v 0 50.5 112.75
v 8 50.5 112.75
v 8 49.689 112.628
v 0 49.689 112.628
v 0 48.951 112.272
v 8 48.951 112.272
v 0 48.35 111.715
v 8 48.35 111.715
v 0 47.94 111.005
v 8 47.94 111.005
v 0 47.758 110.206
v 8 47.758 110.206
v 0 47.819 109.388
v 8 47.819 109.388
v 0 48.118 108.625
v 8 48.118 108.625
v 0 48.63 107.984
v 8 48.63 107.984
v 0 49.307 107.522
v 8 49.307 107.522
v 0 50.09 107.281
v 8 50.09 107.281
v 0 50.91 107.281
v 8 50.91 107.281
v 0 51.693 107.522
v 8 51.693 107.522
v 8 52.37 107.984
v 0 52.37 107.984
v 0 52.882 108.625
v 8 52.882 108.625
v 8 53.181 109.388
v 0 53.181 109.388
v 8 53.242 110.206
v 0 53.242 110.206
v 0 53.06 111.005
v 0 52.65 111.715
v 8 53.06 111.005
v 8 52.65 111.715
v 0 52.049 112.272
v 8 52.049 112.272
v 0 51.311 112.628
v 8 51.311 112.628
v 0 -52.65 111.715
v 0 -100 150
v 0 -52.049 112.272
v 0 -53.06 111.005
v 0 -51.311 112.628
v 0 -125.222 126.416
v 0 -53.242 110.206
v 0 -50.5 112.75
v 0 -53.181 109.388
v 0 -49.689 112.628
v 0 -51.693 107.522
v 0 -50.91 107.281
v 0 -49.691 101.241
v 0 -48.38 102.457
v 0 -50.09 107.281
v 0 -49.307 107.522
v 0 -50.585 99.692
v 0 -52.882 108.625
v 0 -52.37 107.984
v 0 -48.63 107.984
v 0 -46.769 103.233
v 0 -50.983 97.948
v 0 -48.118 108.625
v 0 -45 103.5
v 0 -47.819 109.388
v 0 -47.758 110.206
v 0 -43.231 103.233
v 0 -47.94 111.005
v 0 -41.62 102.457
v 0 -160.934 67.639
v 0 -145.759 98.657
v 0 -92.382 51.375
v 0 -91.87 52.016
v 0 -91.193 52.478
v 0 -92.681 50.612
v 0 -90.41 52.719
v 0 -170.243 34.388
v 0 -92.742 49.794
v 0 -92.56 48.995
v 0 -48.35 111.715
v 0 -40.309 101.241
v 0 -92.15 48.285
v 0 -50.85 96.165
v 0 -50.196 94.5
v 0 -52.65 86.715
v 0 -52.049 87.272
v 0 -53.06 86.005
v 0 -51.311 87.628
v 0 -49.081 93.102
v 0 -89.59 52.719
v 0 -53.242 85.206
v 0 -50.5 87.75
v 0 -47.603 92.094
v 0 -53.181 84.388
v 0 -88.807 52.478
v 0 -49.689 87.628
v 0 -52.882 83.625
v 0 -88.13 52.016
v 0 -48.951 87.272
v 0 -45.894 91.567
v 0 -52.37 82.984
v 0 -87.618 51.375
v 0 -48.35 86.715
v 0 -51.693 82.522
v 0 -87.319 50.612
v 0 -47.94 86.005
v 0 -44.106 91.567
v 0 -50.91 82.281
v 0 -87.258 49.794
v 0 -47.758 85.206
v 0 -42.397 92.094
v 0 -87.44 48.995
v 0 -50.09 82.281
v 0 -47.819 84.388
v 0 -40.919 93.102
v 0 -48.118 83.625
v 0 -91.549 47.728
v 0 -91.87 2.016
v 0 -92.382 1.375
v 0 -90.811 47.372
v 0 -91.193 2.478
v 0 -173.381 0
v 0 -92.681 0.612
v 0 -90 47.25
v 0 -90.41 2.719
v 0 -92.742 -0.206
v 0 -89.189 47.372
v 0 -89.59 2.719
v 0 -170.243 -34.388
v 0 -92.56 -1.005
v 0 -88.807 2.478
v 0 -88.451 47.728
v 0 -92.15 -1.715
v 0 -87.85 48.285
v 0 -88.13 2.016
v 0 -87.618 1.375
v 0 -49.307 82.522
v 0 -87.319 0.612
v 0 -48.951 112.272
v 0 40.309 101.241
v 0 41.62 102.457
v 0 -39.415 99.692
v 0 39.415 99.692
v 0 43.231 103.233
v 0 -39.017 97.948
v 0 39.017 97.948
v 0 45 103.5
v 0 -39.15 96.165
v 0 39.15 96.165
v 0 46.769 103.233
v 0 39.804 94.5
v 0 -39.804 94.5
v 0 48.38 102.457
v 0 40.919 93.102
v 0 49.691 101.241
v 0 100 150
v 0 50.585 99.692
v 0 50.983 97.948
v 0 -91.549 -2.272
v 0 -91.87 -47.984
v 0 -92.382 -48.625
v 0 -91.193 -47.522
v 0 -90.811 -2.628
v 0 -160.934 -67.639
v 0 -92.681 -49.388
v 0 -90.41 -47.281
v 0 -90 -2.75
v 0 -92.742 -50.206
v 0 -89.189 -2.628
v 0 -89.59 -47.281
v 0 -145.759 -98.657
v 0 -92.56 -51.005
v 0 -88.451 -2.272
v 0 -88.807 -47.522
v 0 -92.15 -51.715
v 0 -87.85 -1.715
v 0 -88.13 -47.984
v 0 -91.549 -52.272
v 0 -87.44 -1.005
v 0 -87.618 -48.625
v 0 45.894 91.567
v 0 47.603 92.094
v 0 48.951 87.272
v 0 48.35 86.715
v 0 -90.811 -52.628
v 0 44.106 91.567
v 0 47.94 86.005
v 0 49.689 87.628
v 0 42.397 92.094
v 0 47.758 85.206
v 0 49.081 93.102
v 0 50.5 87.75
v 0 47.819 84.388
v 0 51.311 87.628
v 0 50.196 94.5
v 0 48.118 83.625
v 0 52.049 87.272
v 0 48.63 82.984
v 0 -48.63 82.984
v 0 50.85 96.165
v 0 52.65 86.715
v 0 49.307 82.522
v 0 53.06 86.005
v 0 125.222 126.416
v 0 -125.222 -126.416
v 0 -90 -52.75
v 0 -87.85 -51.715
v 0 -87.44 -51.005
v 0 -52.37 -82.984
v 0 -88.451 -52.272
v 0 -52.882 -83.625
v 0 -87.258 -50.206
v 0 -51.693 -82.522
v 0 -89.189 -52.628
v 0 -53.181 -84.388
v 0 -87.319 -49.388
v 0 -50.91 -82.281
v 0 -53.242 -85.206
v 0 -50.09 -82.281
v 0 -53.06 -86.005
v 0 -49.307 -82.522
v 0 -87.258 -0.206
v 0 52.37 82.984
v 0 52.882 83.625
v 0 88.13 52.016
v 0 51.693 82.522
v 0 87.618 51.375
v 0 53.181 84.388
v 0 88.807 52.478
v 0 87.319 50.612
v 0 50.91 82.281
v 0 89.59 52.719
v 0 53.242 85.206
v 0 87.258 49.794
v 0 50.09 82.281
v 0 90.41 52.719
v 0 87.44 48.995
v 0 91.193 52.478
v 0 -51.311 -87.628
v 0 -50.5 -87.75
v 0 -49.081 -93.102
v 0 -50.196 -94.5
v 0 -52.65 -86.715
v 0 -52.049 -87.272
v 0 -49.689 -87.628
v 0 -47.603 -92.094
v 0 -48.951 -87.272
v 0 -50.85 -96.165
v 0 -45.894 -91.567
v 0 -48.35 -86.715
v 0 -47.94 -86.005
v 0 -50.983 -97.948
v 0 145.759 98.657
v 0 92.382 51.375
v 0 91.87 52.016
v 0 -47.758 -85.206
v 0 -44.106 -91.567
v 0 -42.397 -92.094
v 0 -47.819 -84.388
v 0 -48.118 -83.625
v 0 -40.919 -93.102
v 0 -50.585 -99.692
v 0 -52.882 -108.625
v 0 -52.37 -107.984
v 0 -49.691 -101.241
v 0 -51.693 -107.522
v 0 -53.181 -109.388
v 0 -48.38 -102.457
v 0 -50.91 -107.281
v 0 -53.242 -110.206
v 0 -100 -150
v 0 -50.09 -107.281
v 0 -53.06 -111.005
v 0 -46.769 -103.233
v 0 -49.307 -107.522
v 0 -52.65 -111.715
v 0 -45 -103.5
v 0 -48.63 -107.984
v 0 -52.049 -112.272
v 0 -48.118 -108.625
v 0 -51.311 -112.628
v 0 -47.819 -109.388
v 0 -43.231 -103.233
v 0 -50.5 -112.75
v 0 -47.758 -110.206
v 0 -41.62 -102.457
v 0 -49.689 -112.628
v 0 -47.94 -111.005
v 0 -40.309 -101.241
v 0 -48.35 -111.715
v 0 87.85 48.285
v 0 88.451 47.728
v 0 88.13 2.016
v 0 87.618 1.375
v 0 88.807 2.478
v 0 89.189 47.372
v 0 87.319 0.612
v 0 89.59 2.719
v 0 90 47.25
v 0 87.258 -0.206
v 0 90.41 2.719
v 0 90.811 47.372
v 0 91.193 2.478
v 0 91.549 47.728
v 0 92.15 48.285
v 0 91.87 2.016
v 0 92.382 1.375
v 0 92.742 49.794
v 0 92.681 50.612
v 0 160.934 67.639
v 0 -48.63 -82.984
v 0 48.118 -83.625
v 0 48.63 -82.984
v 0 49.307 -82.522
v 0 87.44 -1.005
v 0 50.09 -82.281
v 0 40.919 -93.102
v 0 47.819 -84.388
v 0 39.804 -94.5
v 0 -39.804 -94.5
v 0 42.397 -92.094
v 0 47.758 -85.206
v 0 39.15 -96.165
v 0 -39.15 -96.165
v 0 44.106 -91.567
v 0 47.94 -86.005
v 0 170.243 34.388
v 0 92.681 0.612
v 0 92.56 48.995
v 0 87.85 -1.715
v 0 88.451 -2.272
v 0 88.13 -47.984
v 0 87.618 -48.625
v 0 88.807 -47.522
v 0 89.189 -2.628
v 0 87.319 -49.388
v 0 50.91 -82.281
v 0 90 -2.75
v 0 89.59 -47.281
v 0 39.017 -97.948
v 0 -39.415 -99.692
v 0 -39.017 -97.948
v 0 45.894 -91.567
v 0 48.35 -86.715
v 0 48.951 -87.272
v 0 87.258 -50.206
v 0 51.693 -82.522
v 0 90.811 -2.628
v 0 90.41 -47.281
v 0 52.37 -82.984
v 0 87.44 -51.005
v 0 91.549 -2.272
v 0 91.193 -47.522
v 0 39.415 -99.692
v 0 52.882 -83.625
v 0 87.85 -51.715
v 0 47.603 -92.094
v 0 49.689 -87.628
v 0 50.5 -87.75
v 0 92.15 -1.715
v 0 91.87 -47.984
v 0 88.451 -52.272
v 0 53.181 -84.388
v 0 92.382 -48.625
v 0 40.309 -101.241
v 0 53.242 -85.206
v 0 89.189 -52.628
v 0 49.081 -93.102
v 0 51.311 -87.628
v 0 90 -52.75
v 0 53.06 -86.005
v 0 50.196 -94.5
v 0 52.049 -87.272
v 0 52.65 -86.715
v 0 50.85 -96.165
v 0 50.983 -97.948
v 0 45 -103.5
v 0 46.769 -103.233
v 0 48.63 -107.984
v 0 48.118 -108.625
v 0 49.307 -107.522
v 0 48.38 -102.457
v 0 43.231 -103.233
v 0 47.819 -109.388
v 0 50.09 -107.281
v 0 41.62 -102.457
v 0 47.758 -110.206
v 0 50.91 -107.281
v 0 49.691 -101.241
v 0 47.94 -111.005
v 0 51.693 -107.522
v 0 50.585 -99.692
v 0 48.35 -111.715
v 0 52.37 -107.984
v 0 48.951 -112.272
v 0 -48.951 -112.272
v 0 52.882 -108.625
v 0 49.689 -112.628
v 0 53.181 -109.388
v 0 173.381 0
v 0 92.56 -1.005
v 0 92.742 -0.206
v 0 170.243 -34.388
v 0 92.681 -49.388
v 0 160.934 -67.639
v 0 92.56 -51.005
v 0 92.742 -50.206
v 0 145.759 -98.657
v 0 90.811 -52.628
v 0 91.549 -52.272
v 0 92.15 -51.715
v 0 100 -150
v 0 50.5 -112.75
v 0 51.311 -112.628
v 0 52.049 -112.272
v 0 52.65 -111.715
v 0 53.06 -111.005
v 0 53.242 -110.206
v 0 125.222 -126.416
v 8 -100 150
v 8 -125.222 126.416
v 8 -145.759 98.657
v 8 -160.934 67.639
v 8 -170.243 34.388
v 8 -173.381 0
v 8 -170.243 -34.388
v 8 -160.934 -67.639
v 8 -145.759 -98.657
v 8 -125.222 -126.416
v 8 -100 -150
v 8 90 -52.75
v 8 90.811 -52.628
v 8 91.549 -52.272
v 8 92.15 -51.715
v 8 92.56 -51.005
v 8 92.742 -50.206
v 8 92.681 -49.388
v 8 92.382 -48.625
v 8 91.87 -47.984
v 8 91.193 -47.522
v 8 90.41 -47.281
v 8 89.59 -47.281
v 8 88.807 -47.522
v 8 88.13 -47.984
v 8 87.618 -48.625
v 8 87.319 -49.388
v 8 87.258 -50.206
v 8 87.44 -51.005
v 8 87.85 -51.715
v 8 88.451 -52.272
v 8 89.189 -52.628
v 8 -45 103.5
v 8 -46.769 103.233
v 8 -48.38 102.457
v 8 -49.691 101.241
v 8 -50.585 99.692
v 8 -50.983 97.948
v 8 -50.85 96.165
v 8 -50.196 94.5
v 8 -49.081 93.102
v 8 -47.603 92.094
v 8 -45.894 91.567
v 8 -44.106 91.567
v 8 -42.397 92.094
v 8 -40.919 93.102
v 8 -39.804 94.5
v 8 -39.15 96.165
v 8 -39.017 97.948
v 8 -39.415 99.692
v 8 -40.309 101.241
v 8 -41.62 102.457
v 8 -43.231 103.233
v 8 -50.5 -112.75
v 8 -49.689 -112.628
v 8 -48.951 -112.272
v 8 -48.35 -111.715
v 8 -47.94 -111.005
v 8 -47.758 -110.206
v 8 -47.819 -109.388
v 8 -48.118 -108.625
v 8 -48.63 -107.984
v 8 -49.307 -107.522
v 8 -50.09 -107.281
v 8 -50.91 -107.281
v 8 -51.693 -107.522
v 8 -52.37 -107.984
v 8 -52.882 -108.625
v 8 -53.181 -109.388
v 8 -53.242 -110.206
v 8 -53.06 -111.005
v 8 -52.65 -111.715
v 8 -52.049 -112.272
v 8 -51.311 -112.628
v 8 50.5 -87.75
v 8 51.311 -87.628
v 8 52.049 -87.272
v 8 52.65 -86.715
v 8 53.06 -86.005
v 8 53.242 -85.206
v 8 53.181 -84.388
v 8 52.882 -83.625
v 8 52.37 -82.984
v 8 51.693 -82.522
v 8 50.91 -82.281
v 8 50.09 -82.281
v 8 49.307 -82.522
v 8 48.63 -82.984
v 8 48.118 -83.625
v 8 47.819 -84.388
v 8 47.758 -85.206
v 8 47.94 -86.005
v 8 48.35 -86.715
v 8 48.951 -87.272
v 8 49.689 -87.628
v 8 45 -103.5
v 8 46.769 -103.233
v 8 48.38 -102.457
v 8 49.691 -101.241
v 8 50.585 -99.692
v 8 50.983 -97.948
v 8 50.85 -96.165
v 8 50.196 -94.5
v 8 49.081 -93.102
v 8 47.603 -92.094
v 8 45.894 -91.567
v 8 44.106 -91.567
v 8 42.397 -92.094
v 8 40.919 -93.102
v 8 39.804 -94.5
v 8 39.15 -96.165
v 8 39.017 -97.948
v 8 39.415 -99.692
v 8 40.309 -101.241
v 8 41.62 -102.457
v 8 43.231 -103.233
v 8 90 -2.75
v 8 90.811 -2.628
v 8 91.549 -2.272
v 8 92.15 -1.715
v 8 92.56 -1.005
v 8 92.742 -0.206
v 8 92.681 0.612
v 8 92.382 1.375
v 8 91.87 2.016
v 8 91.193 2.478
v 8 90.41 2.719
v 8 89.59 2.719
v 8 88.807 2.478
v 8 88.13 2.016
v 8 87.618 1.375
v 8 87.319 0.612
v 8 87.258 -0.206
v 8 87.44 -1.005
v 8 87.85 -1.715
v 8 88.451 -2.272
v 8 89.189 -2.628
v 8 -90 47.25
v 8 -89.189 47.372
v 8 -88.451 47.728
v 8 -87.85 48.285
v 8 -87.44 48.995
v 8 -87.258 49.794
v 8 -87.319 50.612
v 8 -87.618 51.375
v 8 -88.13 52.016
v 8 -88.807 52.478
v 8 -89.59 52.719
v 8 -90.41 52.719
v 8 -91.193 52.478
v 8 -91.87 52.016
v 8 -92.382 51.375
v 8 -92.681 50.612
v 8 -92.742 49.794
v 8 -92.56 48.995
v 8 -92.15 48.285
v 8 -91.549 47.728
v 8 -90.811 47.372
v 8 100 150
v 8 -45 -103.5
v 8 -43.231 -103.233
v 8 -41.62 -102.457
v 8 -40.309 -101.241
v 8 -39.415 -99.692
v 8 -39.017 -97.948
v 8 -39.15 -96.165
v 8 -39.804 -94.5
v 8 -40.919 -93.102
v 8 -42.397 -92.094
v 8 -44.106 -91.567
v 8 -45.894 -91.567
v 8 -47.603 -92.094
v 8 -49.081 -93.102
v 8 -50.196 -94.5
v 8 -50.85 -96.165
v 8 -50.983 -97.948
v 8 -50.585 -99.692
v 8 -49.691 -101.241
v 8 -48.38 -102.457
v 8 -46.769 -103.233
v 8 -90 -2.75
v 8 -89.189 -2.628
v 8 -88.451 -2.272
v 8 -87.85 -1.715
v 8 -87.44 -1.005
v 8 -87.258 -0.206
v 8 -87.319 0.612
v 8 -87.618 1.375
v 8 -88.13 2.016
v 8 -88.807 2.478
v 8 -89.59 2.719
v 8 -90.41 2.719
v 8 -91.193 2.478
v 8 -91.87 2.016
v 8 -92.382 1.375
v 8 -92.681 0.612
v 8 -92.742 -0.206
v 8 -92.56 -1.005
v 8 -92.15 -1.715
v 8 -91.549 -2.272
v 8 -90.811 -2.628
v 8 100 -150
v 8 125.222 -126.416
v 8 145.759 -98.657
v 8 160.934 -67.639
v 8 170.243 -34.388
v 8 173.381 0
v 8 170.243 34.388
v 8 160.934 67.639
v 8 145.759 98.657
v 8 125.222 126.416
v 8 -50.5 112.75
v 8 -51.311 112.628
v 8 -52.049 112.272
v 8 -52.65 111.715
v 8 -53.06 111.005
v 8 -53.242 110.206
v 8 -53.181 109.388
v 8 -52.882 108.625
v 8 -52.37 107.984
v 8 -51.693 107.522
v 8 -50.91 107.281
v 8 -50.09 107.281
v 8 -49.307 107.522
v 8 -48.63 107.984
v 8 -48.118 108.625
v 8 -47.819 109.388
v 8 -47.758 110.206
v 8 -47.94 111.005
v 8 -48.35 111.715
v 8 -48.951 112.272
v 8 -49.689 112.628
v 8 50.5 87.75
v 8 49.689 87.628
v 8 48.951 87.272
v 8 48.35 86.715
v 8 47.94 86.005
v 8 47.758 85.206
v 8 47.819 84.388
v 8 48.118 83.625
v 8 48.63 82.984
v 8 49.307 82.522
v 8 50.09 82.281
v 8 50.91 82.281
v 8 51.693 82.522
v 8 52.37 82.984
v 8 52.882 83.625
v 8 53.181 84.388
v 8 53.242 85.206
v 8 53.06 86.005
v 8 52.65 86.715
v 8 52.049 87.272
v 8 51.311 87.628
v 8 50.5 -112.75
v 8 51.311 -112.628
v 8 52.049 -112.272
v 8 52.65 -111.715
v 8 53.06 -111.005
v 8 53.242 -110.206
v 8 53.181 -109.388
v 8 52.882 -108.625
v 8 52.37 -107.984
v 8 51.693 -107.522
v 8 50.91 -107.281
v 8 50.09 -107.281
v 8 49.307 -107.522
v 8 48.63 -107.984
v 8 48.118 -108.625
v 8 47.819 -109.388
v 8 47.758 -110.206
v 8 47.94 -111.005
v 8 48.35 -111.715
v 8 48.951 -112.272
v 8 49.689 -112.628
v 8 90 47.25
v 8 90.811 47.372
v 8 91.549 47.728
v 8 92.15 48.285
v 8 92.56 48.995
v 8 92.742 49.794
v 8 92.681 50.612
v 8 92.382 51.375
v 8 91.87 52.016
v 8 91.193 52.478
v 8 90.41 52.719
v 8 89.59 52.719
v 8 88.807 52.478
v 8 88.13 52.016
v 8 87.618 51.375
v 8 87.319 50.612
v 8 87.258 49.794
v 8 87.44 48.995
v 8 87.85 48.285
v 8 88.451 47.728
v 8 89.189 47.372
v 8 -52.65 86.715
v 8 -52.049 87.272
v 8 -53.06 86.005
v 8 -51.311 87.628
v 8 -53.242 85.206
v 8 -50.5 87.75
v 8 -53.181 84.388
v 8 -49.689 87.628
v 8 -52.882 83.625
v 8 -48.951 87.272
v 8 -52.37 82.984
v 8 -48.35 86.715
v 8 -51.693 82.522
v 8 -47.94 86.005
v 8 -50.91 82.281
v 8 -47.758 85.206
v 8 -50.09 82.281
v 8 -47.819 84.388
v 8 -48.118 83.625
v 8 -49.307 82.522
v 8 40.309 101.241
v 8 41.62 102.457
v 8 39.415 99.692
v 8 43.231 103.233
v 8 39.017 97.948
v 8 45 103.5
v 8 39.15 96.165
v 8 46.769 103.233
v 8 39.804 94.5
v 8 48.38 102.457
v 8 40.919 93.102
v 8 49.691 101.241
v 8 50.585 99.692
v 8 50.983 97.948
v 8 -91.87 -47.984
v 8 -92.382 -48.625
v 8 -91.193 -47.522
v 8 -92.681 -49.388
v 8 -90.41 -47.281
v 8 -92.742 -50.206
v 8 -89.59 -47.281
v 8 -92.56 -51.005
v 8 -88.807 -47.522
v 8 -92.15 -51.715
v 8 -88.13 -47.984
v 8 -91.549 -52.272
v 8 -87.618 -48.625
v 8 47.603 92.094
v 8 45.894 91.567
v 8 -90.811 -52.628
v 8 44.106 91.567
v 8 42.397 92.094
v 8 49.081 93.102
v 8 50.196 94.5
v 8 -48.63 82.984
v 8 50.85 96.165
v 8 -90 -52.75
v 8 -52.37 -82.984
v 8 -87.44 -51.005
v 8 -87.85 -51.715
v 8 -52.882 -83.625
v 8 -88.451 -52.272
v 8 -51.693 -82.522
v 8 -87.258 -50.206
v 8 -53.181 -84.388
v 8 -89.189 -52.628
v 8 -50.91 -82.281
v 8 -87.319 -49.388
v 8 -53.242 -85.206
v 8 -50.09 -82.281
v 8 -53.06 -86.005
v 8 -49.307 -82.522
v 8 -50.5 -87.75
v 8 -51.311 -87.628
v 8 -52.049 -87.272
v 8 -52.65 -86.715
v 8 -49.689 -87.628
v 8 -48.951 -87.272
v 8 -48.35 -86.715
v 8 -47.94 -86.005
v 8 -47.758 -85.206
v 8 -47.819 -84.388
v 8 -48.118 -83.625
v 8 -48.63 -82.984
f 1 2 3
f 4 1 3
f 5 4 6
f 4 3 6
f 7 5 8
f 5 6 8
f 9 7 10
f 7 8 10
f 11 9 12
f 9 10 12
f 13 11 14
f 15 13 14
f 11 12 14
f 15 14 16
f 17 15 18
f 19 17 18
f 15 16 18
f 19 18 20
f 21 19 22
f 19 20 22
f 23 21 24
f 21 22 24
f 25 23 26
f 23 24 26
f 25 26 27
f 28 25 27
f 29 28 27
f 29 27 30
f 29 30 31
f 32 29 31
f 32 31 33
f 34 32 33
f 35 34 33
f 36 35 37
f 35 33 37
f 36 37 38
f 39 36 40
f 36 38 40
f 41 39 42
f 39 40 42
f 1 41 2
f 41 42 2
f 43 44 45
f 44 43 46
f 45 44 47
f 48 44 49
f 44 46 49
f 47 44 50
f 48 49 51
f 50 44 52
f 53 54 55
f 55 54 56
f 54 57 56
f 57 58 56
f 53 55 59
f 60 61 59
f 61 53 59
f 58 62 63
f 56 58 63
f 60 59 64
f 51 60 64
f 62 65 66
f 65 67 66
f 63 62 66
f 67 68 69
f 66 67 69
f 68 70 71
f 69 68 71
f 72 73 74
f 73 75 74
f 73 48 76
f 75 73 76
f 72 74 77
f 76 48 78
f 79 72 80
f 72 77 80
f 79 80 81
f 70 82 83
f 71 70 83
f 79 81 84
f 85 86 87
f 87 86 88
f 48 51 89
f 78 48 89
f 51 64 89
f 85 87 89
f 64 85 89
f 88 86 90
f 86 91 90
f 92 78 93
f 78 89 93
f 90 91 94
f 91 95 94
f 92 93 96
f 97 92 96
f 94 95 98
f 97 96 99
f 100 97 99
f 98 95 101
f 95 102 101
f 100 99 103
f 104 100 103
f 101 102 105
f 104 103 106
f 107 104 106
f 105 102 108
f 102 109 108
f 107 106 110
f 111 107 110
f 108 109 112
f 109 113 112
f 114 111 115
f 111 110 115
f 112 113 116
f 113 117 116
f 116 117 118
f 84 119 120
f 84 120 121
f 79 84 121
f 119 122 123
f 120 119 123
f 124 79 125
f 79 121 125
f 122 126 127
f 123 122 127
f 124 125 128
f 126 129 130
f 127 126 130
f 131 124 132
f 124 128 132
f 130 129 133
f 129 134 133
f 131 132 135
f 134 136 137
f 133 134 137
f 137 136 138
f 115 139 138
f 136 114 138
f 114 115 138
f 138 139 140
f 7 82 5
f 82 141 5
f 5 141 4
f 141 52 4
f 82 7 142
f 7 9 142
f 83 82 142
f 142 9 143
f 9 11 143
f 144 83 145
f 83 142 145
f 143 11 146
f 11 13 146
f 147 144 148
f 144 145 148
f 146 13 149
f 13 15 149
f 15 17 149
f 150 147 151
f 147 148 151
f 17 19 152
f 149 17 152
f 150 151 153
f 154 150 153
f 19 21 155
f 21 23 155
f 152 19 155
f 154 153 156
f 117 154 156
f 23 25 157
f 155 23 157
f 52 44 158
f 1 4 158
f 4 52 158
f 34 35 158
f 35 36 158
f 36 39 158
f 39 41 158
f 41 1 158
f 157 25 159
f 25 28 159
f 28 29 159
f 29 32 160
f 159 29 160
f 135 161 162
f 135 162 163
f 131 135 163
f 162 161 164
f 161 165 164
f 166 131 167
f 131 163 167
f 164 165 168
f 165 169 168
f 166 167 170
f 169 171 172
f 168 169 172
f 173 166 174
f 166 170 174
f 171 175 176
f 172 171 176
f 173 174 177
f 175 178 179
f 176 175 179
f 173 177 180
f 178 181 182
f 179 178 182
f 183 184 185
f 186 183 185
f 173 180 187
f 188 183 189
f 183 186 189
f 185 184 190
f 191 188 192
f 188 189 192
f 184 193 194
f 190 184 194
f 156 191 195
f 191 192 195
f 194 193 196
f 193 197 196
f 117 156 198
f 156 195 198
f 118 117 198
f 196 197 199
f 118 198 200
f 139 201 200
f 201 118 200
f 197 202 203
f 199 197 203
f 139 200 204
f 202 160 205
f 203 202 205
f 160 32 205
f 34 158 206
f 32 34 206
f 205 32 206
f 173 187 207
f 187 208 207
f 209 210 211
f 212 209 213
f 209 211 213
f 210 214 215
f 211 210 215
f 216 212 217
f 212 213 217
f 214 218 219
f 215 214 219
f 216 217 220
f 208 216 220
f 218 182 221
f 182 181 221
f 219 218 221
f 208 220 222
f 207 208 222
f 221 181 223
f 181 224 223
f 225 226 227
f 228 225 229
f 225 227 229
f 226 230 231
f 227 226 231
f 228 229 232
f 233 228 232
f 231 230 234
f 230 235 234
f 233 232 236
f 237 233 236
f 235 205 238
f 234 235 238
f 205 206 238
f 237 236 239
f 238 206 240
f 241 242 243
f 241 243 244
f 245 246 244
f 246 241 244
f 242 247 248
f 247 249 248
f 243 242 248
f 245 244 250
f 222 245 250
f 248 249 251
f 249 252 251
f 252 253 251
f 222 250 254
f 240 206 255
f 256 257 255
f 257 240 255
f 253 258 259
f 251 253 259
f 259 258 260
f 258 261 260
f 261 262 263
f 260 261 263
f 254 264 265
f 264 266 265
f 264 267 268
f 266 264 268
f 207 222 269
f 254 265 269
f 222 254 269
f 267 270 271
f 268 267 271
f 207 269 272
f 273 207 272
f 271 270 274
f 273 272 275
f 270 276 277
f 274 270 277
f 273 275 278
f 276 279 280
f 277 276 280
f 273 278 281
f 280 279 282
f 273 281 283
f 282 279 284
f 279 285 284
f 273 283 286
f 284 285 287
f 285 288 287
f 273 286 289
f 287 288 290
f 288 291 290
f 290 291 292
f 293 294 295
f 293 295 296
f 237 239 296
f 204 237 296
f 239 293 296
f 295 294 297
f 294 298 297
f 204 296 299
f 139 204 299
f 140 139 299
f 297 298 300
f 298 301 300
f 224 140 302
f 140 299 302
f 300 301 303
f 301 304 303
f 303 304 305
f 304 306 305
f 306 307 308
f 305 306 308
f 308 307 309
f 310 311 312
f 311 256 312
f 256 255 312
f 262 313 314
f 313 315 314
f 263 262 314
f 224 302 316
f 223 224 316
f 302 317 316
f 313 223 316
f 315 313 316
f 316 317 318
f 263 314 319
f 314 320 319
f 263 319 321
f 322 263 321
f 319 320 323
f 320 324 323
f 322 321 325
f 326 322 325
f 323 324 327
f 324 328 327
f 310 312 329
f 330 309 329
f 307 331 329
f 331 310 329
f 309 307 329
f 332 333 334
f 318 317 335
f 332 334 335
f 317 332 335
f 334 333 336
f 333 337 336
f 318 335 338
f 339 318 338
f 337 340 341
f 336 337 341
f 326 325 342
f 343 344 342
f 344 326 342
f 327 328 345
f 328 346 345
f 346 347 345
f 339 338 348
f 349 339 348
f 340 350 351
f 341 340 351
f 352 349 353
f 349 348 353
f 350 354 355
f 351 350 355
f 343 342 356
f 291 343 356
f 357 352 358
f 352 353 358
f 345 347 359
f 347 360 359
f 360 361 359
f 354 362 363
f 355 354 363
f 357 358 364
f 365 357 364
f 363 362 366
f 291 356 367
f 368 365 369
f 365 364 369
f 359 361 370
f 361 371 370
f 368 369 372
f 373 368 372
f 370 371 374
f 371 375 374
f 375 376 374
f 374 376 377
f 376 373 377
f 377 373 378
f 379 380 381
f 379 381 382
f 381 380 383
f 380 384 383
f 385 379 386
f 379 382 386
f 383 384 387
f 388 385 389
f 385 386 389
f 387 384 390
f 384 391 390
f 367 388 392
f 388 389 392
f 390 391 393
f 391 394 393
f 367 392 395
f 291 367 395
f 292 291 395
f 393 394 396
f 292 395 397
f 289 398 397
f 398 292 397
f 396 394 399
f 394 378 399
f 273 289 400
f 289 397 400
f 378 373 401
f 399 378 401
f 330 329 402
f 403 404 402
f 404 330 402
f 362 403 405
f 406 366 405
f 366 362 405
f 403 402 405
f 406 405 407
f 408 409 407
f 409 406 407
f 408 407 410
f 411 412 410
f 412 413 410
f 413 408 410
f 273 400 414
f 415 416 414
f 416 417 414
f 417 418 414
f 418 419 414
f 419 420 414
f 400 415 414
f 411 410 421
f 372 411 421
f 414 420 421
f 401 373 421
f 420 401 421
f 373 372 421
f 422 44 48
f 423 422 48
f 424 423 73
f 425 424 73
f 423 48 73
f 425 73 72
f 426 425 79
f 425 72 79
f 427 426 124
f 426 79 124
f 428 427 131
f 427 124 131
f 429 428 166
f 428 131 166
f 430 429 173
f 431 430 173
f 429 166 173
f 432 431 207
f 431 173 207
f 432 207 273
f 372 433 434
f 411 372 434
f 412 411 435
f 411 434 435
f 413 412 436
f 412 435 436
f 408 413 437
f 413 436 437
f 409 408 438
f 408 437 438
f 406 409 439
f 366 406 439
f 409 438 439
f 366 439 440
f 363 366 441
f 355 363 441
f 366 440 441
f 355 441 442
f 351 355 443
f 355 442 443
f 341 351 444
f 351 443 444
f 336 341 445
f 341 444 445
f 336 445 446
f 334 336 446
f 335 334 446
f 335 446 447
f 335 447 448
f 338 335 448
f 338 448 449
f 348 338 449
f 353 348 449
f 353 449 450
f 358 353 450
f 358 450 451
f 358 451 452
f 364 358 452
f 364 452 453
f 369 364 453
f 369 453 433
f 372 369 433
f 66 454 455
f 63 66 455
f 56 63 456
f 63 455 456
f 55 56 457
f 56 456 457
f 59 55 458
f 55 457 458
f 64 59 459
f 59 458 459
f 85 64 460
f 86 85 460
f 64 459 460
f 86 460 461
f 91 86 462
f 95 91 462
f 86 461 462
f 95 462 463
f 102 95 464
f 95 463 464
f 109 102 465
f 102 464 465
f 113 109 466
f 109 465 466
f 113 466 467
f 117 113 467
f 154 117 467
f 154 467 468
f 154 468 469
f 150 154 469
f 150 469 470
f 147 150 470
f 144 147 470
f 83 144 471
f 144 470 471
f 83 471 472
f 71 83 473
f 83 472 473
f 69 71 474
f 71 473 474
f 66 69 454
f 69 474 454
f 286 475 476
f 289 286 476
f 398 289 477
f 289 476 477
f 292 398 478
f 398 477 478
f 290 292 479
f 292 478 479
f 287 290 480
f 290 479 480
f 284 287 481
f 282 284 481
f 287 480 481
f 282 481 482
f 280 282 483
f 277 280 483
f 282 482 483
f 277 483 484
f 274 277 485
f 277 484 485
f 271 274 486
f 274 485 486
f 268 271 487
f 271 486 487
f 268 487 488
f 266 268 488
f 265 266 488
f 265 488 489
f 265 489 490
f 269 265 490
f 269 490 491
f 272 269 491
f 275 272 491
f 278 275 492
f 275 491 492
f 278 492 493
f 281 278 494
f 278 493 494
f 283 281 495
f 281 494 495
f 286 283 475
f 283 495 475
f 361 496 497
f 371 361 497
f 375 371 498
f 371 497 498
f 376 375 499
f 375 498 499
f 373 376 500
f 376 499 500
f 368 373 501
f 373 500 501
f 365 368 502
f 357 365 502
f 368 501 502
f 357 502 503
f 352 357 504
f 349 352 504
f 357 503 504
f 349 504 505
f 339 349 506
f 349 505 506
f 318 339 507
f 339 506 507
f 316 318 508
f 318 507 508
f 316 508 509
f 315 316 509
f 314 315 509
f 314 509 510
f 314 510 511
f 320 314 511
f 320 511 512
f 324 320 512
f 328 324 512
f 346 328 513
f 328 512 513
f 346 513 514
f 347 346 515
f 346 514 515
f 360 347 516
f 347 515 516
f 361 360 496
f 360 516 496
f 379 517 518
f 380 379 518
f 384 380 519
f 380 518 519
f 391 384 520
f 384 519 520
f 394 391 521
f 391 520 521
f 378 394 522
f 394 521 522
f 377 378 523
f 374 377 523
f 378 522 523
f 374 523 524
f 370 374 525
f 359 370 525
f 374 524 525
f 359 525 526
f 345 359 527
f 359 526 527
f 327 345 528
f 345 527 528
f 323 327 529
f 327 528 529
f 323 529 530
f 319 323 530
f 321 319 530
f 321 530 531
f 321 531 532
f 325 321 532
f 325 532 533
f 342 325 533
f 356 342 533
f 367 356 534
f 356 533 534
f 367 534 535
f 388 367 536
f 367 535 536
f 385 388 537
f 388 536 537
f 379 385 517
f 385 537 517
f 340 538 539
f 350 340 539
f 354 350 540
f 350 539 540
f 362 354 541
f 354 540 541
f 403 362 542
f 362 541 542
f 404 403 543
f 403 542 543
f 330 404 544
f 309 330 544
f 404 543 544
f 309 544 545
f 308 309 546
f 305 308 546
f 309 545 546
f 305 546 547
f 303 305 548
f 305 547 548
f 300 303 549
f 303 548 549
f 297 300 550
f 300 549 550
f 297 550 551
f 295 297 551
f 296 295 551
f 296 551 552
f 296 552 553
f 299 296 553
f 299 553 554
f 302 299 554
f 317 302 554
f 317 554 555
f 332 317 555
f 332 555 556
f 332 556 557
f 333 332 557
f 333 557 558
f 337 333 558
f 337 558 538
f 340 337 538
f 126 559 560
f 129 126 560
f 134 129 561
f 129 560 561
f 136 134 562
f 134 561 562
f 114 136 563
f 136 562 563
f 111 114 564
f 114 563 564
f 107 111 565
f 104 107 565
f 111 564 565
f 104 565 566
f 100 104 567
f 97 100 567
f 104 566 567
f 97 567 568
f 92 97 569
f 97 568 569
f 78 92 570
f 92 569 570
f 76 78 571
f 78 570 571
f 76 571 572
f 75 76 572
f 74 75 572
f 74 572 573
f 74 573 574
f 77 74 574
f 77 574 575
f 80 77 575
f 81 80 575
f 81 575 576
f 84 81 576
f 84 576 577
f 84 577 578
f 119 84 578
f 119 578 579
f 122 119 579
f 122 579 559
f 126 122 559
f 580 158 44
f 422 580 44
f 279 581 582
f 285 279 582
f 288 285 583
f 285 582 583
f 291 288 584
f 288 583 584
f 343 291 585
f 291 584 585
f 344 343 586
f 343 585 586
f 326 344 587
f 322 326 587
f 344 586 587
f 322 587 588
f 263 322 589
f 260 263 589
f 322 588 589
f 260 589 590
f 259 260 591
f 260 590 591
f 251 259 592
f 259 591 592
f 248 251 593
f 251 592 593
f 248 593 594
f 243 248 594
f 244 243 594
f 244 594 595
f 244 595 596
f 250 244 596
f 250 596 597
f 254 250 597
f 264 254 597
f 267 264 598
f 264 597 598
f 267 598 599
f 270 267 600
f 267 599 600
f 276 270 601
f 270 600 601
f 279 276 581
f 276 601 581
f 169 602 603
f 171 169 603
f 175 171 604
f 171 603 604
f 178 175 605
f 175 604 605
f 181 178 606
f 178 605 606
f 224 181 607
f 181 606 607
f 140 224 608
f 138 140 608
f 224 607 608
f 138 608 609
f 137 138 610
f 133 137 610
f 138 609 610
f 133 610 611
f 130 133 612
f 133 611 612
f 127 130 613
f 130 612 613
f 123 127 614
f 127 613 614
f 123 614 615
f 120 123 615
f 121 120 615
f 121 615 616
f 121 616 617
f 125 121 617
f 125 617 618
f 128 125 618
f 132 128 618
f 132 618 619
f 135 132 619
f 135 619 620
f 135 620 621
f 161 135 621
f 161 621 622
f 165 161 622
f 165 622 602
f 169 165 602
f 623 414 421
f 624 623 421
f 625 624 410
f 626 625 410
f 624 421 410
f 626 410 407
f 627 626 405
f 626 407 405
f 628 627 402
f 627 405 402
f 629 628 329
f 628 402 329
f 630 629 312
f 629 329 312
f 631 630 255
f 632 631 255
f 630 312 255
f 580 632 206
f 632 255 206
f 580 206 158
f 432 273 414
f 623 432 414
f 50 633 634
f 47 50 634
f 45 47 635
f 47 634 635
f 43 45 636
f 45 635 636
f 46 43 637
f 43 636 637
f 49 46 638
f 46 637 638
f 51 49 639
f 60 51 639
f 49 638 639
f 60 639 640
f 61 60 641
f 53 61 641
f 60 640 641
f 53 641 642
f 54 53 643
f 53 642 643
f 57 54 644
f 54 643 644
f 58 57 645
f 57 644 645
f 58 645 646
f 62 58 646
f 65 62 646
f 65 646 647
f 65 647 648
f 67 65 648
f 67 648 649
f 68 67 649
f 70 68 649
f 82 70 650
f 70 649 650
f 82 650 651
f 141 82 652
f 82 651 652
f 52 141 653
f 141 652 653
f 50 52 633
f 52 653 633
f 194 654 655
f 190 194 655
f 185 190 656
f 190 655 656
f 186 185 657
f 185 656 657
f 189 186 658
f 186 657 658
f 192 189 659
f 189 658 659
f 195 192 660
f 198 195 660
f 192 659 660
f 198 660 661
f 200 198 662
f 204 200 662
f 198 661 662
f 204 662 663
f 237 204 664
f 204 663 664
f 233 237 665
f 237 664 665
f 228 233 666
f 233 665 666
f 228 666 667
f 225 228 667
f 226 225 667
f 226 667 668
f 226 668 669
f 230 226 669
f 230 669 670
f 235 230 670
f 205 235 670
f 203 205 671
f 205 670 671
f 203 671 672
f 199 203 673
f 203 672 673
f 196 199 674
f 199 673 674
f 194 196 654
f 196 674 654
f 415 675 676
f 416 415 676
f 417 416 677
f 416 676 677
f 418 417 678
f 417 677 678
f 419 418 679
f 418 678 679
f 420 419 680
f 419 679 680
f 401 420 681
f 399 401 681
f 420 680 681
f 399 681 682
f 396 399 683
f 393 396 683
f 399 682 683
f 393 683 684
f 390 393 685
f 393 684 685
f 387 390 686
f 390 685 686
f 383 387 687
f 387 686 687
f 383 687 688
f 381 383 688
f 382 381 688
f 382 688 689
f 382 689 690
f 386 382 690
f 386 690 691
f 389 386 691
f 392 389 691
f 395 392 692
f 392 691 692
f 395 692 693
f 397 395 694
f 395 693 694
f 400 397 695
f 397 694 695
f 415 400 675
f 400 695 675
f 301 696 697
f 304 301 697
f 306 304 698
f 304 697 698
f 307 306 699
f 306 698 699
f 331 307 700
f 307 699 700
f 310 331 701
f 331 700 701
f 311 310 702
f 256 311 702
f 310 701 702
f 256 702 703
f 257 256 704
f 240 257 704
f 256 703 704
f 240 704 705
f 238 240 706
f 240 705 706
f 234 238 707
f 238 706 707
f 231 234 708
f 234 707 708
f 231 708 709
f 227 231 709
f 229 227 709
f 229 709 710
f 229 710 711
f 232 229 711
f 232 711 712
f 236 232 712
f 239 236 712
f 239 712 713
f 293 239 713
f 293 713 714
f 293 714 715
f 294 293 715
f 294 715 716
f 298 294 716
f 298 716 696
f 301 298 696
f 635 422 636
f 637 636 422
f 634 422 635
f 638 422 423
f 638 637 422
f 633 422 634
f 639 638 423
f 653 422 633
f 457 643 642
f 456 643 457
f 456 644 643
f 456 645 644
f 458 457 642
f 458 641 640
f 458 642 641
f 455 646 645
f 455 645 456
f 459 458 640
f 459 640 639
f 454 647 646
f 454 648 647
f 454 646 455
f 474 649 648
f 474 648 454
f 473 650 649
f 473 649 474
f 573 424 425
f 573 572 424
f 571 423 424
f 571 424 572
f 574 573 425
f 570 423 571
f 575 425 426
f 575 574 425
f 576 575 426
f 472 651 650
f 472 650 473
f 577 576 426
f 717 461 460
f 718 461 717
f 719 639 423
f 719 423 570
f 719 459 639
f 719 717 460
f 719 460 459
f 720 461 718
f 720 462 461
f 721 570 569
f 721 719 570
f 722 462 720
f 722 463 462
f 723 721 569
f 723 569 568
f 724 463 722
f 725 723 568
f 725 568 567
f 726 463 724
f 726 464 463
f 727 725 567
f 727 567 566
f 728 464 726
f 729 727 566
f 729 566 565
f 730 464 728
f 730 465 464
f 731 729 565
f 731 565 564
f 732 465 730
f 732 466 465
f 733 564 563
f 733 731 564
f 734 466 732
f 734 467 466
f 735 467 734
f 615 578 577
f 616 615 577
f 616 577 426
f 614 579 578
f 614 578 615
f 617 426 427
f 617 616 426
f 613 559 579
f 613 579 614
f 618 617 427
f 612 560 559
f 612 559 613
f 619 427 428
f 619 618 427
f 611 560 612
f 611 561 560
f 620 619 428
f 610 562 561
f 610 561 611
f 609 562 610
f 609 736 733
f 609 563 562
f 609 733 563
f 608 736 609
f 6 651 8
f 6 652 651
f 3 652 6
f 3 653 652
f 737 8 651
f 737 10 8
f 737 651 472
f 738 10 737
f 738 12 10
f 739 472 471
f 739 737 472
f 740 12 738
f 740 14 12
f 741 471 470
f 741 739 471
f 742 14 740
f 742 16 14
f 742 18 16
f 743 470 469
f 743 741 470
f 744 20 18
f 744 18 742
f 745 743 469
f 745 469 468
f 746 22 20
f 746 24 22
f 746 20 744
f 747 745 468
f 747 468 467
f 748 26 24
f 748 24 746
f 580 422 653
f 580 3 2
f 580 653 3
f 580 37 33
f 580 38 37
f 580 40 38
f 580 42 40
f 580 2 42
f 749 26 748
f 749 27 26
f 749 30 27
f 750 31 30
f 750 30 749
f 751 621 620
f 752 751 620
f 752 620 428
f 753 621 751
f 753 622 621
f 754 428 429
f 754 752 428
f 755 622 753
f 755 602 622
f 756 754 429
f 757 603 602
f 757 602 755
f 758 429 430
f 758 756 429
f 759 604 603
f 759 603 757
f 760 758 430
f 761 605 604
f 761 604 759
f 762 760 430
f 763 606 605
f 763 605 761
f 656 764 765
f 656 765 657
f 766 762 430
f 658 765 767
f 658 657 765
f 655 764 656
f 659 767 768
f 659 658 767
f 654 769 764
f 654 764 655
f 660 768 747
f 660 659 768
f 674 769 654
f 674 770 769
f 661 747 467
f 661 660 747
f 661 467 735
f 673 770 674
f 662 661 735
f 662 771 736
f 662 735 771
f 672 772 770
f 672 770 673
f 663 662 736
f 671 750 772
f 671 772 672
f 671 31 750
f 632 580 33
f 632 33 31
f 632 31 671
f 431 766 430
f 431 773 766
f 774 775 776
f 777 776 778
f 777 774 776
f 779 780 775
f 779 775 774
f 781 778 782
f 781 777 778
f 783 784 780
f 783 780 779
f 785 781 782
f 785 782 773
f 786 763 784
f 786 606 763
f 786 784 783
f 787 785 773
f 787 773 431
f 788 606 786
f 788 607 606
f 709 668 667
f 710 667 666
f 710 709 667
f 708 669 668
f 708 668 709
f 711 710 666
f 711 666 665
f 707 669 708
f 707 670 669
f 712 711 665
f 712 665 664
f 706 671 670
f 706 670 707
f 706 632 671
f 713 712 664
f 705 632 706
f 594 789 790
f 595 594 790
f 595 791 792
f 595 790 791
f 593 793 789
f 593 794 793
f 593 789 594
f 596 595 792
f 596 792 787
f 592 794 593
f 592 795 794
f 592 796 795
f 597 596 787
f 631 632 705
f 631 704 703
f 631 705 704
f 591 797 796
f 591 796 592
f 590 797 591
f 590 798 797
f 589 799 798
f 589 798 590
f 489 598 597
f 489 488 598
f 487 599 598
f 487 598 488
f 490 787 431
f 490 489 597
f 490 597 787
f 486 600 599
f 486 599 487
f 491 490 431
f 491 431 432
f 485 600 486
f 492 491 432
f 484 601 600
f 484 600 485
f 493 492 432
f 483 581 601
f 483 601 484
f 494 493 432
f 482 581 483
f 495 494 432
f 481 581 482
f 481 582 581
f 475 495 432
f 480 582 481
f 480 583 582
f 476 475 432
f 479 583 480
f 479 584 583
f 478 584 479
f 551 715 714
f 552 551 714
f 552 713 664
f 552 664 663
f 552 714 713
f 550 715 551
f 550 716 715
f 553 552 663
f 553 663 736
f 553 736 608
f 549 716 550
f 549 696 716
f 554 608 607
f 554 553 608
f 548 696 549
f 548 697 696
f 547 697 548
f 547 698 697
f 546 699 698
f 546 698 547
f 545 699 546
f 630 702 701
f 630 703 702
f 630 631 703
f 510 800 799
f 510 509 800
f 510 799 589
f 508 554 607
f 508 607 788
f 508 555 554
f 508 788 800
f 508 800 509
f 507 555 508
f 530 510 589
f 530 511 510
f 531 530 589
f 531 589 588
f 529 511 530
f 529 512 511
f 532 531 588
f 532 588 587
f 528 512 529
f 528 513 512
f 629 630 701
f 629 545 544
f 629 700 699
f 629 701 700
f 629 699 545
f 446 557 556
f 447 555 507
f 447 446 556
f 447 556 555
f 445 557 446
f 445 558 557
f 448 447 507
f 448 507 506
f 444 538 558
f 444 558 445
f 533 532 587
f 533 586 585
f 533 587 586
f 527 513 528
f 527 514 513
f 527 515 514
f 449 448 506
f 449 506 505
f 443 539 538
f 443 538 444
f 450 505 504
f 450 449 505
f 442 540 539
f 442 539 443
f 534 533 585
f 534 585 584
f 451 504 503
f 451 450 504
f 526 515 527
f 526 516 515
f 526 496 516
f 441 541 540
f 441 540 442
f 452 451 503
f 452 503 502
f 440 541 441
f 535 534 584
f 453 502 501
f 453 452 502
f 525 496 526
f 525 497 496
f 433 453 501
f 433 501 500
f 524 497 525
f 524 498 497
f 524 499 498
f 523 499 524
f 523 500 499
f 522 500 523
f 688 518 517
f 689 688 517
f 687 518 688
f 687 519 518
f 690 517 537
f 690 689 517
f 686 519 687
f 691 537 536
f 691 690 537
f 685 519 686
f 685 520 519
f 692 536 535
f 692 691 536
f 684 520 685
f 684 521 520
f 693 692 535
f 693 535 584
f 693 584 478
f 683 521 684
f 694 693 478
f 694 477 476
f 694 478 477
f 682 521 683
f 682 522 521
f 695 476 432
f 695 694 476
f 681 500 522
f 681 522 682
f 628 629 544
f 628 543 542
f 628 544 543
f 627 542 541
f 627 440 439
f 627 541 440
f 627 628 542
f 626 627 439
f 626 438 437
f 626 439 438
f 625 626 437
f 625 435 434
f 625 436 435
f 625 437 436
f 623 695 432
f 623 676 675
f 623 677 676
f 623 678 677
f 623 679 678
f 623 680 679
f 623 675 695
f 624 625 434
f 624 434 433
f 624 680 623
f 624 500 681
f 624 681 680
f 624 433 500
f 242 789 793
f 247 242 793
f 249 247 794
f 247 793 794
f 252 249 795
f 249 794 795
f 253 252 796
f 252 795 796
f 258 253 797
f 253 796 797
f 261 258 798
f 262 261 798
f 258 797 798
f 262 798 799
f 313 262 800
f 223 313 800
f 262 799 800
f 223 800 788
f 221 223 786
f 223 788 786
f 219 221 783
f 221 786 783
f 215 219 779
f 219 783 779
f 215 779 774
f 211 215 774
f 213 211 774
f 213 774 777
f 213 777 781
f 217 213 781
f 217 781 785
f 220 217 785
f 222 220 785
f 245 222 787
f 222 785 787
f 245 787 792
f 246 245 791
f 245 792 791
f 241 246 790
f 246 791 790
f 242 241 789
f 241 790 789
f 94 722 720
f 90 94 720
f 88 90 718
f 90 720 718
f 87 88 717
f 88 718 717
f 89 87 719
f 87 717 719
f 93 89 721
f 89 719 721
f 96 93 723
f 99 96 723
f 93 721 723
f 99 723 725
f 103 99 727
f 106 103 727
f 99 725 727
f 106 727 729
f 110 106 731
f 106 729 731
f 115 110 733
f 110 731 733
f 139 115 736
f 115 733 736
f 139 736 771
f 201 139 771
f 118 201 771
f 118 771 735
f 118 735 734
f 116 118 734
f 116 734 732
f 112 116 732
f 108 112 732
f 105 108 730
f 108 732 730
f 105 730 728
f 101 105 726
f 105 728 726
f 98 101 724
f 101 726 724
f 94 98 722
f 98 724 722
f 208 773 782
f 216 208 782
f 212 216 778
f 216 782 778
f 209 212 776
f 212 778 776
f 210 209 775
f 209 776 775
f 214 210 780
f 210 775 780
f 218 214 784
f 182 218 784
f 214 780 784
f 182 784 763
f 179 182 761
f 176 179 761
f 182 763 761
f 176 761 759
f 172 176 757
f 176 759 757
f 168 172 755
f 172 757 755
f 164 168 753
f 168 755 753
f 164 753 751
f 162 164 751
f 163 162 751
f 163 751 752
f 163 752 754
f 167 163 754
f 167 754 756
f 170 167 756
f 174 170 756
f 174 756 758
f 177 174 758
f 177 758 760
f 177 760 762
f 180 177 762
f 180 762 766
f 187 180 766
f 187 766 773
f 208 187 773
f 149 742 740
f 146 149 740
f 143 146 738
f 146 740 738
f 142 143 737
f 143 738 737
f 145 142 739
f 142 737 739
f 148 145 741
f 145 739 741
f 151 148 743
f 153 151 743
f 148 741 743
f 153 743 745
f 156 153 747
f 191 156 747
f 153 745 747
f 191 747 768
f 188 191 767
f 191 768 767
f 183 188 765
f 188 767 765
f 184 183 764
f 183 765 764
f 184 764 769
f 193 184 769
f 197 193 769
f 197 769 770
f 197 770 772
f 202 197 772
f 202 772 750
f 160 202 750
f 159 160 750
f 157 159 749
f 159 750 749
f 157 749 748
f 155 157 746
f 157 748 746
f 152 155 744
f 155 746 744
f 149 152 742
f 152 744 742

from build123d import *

# Parameters (mm, degrees)
EXTRUDE_1_DEPTH     = 8
SKETCH_2_R          = 6
SKETCH_2_R_2        = 2.75
CUT_EXTRUDE_1_DEPTH = 8
SKETCH_3_R          = 2.75
CUT_EXTRUDE_2_DEPTH = 10


with BuildPart() as part:
    # 草图1 → 凸台-拉伸1 (new body)
    with BuildSketch(Plane(origin=(0, 0, 0), x_dir=(0, 0, -1), z_dir=(1, 0, 0))):
        with BuildLine():
            Line((-150, 100), (-150, -100))
            ThreePointArc((-150, -100), (0, -173.380962103), (150, -100))
            Line((150, -100), (150, 100))
            ThreePointArc((150, 100), (0, 173.380962103), (-150, 100))
        make_face()
    extrude(amount=EXTRUDE_1_DEPTH)

    # 草图2 → 切除-拉伸1 (cut)
    with BuildSketch(Plane(origin=(8, 0, 0), x_dir=(0, 0, -1), z_dir=(1, 0, 0))):
        with Locations((97.5, 45)):
            Circle(SKETCH_2_R)
        with Locations((97.5, -45)):
            Circle(SKETCH_2_R)
        with Locations((85, 50.5)):
            Circle(SKETCH_2_R_2)
        with Locations((110, 50.5)):
            Circle(SKETCH_2_R_2)
        with Locations((85, -50.5)):
            Circle(SKETCH_2_R_2)
        with Locations((110, -50.5)):
            Circle(SKETCH_2_R_2)
        with Locations(Location((-110, -50.5, 0), (0, 0, 180))):
            Circle(SKETCH_2_R_2)
        with Locations(Location((-85, -50.5, 0), (0, 0, 180))):
            Circle(SKETCH_2_R_2)
        with Locations(Location((-110, 50.5, 0), (0, 0, 180))):
            Circle(SKETCH_2_R_2)
        with Locations(Location((-85, 50.5, 0), (0, 0, 180))):
            Circle(SKETCH_2_R_2)
        with Locations(Location((-97.5, -45, 0), (0, 0, 180))):
            Circle(SKETCH_2_R)
        with Locations(Location((-97.5, 45, 0), (0, 0, 180))):
            Circle(SKETCH_2_R)
    extrude(amount=-CUT_EXTRUDE_1_DEPTH, mode=Mode.SUBTRACT)

    # 草图3 → 切除-拉伸2 (cut)
    with BuildSketch(Plane(origin=(8, 0, 0), x_dir=(0, 0, -1), z_dir=(1, 0, 0))):
        with Locations((-50, 90)):
            Circle(SKETCH_3_R)
        with Locations((0, 90)):
            Circle(SKETCH_3_R)
        with Locations((50, 90)):
            Circle(SKETCH_3_R)
        with Locations((50, -90)):
            Circle(SKETCH_3_R)
        with Locations((0, -90)):
            Circle(SKETCH_3_R)
        with Locations((-50, -90)):
            Circle(SKETCH_3_R)
    extrude(amount=-CUT_EXTRUDE_2_DEPTH, mode=Mode.SUBTRACT)


solid = part.part
